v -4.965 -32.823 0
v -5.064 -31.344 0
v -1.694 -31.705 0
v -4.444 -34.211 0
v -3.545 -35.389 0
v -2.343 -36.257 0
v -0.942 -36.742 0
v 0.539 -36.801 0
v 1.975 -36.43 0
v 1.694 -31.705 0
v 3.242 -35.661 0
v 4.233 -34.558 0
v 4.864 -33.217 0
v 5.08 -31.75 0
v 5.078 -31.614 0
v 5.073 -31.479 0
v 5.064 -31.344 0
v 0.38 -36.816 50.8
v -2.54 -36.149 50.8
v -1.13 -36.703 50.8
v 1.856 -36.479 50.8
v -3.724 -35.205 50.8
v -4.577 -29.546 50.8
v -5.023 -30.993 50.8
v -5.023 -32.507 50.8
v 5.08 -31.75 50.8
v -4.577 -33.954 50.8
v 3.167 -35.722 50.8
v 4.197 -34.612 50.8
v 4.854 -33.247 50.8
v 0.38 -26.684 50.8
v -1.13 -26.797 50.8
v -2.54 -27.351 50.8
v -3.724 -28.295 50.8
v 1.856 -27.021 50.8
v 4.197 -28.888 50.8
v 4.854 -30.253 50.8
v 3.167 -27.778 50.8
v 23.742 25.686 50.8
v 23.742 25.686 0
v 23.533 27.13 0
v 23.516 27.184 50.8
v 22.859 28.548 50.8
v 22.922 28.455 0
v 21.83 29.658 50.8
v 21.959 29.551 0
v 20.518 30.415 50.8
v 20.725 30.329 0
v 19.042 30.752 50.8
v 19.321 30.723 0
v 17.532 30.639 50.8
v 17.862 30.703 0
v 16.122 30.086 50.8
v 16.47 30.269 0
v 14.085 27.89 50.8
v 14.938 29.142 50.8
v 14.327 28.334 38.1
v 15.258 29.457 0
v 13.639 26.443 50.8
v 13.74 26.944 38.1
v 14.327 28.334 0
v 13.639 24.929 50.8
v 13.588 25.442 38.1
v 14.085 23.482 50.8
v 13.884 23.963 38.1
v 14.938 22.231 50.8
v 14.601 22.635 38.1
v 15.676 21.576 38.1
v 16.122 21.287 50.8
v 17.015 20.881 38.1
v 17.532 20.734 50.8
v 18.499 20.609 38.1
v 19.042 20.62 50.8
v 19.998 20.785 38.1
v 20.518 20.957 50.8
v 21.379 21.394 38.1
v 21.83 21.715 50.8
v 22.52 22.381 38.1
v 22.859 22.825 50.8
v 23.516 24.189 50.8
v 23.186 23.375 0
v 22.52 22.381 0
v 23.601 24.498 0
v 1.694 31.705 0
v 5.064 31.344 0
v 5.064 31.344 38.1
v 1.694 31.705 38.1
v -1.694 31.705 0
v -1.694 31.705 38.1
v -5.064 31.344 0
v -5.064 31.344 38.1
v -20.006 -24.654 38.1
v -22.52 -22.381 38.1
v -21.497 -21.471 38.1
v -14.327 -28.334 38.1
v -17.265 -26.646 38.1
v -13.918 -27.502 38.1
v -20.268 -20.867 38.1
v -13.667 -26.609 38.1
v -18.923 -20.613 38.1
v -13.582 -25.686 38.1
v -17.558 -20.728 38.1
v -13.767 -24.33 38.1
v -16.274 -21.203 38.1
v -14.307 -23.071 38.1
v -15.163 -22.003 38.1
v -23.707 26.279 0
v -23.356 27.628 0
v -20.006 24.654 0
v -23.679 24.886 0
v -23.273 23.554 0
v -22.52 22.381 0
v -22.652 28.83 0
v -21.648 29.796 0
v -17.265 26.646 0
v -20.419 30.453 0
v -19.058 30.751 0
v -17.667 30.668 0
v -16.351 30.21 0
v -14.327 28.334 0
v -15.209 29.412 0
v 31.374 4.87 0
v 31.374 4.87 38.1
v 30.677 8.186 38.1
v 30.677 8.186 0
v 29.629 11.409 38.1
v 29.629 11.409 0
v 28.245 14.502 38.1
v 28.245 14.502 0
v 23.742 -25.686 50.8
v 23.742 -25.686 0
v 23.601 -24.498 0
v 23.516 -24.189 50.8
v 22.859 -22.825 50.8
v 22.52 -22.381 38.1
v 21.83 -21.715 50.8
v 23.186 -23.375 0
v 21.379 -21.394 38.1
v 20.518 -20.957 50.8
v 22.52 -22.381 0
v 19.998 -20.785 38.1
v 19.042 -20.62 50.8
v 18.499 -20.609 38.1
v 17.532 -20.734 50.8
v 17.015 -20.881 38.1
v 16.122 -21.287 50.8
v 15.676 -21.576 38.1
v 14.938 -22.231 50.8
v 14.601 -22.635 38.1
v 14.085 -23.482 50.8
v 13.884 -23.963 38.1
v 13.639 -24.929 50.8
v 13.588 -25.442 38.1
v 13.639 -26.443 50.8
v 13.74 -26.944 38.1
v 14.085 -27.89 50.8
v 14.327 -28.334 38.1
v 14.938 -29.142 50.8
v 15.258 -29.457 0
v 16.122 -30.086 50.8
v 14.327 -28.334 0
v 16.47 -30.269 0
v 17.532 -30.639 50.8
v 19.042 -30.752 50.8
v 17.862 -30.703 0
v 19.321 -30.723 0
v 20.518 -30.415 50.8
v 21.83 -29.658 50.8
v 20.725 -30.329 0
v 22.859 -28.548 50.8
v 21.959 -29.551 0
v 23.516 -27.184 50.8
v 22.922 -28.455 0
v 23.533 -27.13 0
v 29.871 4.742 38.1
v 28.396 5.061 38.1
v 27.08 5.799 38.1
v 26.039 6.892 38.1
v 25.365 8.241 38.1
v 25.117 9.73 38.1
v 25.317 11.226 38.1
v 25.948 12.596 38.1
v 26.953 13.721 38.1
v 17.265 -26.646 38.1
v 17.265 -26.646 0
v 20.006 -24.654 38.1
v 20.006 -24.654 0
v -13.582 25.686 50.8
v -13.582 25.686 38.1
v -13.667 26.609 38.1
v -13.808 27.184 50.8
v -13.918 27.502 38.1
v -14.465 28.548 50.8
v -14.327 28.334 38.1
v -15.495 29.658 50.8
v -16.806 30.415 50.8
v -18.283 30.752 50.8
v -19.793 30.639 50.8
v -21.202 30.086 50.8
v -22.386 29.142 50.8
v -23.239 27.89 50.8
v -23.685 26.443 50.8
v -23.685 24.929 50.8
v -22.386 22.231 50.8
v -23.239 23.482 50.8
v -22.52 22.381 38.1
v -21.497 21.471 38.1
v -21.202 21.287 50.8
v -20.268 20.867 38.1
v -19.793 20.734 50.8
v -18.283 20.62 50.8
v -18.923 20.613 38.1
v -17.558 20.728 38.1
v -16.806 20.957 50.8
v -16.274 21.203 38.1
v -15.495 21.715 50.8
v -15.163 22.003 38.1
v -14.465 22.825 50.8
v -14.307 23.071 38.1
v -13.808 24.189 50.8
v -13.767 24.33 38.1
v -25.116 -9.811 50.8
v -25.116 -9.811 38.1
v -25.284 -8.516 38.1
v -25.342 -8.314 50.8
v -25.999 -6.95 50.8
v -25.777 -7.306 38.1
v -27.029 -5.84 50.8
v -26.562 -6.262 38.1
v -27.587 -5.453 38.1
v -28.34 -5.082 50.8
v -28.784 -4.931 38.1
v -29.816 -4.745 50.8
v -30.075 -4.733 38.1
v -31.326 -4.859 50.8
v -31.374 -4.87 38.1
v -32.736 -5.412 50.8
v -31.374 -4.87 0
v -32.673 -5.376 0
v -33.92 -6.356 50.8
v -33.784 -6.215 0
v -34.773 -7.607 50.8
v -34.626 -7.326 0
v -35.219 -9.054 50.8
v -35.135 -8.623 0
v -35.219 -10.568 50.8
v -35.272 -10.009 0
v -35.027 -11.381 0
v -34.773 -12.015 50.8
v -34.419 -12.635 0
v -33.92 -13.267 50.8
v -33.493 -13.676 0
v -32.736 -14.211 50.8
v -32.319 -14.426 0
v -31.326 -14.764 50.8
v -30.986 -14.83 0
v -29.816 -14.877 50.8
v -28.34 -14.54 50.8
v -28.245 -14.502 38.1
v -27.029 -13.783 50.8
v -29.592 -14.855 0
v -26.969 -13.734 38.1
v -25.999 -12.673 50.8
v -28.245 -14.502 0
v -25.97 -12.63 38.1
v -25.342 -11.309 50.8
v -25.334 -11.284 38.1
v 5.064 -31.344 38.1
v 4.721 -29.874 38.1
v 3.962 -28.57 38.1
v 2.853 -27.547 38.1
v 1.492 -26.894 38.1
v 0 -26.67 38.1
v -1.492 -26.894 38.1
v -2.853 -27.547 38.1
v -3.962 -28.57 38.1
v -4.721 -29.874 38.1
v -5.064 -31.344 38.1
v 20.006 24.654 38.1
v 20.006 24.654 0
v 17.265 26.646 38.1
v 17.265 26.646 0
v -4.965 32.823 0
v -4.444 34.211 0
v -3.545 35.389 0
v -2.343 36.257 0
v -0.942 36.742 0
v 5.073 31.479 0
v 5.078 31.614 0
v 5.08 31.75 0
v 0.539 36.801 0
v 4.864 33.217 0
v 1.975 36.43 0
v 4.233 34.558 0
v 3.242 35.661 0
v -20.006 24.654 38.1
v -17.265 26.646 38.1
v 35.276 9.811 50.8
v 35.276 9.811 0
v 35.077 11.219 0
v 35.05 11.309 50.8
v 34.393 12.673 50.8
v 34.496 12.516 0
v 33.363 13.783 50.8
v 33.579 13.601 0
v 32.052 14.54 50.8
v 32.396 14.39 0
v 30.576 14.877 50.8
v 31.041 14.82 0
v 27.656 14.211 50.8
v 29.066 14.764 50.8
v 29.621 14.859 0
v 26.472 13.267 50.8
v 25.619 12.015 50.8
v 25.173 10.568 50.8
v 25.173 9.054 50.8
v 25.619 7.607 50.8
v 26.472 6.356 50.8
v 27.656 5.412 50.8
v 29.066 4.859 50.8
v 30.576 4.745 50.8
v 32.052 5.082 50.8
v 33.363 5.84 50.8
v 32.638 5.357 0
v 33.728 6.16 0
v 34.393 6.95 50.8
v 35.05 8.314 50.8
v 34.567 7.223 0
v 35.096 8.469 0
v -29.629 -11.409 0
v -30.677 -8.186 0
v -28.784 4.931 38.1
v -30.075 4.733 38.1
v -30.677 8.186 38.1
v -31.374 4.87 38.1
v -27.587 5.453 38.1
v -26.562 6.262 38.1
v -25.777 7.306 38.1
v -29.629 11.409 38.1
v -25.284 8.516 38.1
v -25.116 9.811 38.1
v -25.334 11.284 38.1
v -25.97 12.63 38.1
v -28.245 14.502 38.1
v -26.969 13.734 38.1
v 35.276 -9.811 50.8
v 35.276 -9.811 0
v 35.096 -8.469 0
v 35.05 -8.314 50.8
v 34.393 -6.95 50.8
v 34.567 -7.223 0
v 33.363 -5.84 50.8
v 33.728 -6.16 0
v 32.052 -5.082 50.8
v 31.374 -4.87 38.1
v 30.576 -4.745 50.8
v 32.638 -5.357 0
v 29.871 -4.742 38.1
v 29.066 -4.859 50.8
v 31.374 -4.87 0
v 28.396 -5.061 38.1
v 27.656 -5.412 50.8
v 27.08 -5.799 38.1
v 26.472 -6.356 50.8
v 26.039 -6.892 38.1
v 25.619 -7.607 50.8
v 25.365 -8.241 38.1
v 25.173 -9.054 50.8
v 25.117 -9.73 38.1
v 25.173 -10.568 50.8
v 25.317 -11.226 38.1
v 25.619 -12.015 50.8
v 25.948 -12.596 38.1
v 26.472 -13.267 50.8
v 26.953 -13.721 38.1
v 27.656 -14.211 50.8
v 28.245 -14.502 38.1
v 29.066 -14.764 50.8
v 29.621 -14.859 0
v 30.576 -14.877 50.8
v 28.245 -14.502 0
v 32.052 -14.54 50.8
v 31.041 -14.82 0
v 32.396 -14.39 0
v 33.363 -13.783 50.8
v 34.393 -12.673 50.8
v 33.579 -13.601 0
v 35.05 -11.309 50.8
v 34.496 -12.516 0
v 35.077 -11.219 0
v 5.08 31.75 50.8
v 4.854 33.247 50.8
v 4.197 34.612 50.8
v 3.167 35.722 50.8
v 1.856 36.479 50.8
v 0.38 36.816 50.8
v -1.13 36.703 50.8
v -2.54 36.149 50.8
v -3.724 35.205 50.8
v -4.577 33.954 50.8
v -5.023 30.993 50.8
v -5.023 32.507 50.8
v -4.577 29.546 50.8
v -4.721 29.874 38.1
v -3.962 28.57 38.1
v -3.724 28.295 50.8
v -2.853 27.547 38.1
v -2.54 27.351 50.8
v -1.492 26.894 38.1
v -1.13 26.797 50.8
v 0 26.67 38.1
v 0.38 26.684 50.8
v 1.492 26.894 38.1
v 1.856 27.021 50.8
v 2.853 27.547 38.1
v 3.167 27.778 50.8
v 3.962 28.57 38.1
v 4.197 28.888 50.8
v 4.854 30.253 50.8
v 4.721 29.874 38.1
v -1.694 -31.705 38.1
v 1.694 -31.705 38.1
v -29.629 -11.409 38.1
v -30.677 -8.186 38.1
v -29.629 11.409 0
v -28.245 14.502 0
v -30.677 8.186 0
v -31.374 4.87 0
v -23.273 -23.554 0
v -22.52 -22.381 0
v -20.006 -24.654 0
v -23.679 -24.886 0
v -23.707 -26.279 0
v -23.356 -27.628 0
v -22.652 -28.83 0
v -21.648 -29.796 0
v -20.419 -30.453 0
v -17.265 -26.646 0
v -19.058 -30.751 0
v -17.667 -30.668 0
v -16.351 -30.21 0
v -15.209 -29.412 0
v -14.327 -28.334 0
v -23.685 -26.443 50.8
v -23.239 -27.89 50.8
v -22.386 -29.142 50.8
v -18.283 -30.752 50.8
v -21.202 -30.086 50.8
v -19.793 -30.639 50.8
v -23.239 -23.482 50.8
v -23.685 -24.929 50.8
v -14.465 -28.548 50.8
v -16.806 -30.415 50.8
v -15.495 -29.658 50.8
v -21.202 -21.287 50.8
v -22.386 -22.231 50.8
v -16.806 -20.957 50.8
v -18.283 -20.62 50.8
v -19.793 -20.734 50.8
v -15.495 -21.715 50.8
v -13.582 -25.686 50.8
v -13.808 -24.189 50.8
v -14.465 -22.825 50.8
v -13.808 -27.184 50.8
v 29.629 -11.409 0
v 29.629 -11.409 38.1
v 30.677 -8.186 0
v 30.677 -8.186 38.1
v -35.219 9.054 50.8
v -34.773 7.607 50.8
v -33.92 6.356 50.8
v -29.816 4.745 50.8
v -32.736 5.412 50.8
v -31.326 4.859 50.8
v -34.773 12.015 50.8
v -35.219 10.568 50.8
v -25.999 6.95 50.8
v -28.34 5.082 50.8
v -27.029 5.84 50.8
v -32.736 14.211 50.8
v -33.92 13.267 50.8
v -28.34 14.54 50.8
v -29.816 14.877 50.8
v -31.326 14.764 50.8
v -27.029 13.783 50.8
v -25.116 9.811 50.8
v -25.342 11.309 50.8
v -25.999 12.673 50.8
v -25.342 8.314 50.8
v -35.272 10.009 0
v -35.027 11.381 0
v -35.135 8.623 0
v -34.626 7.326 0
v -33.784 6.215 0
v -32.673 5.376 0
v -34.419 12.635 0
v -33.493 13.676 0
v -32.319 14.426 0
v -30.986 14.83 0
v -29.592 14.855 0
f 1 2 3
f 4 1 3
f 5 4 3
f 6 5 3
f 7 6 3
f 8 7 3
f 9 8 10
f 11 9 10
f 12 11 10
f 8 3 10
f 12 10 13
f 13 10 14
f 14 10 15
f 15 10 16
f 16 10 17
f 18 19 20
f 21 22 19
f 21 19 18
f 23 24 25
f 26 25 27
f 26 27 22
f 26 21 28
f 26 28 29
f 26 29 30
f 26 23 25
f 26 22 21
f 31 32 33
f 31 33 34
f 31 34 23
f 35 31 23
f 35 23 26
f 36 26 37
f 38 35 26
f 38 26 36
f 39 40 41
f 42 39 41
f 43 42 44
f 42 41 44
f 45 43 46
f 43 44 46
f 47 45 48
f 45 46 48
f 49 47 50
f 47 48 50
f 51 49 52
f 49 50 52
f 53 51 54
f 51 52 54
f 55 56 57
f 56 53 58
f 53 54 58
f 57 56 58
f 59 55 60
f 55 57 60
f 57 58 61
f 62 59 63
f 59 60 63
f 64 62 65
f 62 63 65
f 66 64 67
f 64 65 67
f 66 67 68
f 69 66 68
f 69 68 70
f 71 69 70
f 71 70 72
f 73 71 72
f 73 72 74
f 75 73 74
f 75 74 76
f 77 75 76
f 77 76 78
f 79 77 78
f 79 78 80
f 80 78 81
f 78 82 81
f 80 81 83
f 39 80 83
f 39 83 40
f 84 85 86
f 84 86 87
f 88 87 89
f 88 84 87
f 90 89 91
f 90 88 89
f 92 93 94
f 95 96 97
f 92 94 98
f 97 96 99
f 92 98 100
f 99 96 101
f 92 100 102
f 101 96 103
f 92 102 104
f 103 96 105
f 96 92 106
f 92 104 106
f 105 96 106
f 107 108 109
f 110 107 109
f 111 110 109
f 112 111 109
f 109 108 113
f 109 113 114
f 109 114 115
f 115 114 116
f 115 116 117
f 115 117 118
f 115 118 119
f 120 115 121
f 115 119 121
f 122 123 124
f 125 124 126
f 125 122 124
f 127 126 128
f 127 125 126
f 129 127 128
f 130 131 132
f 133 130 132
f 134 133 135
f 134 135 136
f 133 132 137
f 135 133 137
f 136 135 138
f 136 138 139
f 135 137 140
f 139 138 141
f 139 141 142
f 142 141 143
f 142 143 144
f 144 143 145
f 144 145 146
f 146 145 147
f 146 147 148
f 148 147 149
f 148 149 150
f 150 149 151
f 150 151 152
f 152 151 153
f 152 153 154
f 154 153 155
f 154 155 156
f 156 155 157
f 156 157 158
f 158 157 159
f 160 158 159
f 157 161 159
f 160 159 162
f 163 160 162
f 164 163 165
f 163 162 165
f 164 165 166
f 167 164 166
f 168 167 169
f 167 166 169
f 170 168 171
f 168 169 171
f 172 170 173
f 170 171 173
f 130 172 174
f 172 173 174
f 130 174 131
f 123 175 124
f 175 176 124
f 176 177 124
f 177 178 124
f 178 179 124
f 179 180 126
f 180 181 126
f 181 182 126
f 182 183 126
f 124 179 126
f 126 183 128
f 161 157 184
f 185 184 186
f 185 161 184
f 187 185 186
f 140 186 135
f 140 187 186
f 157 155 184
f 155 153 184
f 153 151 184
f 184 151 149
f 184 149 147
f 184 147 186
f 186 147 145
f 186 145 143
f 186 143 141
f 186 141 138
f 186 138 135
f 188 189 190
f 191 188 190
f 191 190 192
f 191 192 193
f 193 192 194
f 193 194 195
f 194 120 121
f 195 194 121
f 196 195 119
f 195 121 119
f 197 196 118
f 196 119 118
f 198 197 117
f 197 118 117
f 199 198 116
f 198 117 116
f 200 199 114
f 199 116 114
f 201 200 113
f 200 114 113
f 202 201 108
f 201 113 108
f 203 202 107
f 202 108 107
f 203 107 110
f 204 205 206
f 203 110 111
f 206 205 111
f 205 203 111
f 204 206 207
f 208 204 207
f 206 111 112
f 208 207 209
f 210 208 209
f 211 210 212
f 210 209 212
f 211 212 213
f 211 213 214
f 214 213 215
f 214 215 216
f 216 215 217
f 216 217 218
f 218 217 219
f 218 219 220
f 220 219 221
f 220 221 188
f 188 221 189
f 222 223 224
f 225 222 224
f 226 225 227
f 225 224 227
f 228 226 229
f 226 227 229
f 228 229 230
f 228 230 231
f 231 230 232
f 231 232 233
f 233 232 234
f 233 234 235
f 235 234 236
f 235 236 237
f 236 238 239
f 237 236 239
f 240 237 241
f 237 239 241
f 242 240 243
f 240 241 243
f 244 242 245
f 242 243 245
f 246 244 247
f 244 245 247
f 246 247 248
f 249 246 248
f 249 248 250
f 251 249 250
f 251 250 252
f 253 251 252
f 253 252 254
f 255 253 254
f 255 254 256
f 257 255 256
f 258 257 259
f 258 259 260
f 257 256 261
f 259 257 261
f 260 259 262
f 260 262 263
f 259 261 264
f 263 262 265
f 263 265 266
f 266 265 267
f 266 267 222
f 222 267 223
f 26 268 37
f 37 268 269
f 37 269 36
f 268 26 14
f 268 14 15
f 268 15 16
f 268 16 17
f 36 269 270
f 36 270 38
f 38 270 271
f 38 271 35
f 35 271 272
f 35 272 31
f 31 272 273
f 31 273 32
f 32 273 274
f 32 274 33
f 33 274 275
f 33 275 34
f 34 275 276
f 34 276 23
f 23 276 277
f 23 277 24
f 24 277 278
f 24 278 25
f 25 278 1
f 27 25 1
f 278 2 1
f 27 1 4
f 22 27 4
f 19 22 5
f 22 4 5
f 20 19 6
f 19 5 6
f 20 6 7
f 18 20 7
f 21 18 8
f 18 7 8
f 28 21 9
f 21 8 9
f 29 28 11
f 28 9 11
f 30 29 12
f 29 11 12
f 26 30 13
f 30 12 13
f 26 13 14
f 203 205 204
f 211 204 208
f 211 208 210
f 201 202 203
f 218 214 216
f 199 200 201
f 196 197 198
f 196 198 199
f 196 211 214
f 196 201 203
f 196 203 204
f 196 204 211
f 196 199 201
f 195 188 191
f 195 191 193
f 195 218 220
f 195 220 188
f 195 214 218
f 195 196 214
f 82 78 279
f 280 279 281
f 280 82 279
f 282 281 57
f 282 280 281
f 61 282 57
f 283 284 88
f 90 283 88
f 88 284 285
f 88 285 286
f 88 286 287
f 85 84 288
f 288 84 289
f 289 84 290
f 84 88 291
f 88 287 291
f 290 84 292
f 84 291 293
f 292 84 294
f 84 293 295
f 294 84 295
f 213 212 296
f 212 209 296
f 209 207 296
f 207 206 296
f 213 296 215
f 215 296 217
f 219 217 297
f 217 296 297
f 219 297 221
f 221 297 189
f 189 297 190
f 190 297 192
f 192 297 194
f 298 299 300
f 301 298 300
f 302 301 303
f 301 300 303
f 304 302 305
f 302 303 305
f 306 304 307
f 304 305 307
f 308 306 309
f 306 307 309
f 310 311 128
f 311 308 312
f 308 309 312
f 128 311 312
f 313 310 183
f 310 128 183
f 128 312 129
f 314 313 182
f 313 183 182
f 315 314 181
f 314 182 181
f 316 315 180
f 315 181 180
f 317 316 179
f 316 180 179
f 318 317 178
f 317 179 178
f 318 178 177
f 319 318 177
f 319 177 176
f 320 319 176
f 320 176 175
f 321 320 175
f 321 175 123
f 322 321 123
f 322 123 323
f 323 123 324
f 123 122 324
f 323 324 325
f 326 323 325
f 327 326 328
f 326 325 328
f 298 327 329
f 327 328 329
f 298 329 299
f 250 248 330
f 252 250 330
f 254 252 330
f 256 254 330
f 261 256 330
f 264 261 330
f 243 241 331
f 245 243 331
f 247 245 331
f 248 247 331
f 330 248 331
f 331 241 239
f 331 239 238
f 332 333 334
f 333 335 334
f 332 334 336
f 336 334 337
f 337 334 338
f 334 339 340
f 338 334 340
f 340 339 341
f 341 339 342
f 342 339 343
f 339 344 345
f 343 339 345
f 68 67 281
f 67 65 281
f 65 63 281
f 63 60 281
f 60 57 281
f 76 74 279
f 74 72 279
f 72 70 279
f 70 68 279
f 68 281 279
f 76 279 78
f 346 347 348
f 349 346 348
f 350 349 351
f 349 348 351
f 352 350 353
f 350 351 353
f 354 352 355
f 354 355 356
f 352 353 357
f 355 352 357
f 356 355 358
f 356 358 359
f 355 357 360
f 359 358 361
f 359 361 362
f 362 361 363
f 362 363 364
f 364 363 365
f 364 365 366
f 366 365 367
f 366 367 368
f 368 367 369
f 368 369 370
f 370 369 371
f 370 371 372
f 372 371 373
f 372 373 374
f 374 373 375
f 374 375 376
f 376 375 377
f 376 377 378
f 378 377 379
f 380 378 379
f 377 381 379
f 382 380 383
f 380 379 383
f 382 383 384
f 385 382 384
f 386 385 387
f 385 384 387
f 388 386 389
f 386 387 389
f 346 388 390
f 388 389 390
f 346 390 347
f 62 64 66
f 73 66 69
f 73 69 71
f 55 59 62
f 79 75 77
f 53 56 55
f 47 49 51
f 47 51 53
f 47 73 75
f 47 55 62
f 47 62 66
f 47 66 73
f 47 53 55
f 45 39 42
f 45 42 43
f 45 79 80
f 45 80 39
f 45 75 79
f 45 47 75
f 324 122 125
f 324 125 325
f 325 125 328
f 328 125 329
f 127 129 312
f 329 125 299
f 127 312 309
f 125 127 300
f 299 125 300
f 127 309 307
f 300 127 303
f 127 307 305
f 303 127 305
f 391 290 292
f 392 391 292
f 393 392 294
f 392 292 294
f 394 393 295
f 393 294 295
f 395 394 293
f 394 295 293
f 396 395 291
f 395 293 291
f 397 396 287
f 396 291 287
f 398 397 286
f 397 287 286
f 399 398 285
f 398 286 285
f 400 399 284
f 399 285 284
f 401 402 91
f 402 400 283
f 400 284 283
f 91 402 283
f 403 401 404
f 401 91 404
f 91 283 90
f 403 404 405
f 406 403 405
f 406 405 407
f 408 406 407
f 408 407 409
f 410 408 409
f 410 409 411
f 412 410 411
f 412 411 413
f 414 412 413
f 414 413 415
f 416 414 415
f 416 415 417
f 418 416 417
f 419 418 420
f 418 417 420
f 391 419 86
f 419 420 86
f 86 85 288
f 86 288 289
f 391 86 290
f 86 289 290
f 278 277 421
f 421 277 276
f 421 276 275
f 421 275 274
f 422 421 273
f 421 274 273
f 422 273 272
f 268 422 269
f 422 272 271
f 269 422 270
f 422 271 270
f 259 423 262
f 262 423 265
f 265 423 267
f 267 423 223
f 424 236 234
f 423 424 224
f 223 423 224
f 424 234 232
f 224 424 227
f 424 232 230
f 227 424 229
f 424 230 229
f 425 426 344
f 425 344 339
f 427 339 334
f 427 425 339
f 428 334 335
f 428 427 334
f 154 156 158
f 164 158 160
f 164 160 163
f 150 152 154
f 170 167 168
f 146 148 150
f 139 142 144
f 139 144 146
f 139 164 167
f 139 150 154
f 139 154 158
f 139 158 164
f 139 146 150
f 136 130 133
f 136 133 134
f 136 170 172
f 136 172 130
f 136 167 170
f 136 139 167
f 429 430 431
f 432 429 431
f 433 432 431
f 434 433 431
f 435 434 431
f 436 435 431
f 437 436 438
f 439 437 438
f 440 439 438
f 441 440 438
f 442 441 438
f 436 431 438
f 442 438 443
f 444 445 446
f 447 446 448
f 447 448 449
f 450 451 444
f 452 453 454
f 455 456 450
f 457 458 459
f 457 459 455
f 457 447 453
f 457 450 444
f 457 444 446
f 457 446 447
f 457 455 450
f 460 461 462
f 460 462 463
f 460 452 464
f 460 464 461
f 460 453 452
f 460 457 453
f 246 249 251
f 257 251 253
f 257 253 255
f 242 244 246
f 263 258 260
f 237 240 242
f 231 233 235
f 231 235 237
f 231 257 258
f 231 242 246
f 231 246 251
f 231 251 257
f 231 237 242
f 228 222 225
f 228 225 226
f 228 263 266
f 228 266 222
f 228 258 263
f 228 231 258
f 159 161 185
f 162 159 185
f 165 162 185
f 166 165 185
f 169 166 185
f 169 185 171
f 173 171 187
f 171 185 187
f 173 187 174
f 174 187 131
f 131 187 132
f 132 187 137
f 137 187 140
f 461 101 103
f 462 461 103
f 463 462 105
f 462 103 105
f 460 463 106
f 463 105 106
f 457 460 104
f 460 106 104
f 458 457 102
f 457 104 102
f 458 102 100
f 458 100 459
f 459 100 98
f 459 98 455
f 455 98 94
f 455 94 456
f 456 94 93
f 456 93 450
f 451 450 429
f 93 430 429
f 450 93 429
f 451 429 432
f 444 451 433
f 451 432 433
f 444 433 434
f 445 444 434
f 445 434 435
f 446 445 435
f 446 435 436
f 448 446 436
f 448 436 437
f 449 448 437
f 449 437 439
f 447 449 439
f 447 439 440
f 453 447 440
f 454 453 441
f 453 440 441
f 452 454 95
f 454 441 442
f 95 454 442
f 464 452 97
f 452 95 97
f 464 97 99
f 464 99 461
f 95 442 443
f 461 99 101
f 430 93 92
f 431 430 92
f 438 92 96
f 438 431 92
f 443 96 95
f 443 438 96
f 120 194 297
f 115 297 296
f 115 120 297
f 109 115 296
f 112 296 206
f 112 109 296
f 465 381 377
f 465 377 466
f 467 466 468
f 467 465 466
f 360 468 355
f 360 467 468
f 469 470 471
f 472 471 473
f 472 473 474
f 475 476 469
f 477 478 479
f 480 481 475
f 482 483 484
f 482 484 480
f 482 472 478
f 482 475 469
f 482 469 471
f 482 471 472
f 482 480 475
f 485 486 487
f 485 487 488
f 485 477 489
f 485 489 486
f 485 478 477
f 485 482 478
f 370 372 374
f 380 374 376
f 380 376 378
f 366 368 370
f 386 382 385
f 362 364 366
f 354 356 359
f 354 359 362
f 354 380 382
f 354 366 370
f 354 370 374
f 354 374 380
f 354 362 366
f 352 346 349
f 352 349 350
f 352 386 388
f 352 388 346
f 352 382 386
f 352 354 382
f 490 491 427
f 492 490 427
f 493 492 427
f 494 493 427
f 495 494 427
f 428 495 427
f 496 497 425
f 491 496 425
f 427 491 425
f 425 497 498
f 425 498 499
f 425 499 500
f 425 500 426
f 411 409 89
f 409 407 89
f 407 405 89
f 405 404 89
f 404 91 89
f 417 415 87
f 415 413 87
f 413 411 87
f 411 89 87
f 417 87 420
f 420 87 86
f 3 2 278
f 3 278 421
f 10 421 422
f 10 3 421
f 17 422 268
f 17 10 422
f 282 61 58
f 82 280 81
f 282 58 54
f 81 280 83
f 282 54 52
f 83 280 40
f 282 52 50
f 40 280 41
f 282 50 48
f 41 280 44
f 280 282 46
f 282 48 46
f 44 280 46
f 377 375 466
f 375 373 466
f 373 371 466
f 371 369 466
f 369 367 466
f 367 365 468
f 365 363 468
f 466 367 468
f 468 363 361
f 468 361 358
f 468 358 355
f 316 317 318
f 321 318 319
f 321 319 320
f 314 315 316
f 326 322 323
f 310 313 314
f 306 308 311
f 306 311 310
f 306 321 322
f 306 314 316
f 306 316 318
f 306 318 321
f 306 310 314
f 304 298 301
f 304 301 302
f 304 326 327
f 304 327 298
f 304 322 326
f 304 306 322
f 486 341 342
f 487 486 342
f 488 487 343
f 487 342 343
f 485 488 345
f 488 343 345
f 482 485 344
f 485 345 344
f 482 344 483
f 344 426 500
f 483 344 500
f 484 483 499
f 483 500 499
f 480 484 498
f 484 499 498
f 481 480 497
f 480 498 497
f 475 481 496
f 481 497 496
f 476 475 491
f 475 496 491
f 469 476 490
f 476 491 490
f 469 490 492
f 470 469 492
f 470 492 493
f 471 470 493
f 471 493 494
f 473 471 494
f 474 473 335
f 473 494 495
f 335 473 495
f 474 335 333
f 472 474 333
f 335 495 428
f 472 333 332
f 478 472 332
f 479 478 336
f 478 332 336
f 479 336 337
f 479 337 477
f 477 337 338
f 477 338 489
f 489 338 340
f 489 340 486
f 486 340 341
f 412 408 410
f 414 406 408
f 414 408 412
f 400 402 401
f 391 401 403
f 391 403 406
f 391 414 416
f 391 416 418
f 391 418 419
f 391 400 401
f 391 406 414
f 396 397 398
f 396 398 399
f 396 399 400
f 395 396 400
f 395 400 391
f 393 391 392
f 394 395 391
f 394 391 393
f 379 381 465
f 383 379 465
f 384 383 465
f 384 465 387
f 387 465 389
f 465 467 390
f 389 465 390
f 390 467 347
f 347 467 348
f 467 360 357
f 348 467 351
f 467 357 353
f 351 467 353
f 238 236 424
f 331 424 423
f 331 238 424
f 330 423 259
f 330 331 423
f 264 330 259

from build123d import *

# Parameters (mm, degrees)
F0_R     = 31.75
F1_DEPTH = 38.1
F2_R     = 5.08
F3_DEPTH = 50.8


with BuildPart() as f1:
    # F0 (on Top) → F1 (new body)
    with BuildSketch(Plane.XY):
        Circle(F0_R)
    extrude(amount=F1_DEPTH)


with BuildPart() as f3:
    # F2 (on Top) → F3 (new body)
    with BuildSketch(Plane.XY):
        with Locations((0, 31.75)):
            Circle(F2_R)
        with Locations((-18.662182, 25.68629)):
            Circle(F2_R)
        with Locations((-30.196044, 9.81129)):
            Circle(F2_R)
        with Locations((-30.196044, -9.81129)):
            Circle(F2_R)
        with Locations((-18.662182, -25.68629)):
            Circle(F2_R)
        with Locations((0, -31.75)):
            Circle(F2_R)
        with Locations((18.662182, -25.68629)):
            Circle(F2_R)
        with Locations((30.196044, -9.81129)):
            Circle(F2_R)
        with Locations((30.196044, 9.81129)):
            Circle(F2_R)
        with Locations((18.662182, 25.68629)):
            Circle(F2_R)
    extrude(amount=F3_DEPTH)

    # F4: cut F1
    add(f1.part, mode=Mode.SUBTRACT)


solid = f3.part
